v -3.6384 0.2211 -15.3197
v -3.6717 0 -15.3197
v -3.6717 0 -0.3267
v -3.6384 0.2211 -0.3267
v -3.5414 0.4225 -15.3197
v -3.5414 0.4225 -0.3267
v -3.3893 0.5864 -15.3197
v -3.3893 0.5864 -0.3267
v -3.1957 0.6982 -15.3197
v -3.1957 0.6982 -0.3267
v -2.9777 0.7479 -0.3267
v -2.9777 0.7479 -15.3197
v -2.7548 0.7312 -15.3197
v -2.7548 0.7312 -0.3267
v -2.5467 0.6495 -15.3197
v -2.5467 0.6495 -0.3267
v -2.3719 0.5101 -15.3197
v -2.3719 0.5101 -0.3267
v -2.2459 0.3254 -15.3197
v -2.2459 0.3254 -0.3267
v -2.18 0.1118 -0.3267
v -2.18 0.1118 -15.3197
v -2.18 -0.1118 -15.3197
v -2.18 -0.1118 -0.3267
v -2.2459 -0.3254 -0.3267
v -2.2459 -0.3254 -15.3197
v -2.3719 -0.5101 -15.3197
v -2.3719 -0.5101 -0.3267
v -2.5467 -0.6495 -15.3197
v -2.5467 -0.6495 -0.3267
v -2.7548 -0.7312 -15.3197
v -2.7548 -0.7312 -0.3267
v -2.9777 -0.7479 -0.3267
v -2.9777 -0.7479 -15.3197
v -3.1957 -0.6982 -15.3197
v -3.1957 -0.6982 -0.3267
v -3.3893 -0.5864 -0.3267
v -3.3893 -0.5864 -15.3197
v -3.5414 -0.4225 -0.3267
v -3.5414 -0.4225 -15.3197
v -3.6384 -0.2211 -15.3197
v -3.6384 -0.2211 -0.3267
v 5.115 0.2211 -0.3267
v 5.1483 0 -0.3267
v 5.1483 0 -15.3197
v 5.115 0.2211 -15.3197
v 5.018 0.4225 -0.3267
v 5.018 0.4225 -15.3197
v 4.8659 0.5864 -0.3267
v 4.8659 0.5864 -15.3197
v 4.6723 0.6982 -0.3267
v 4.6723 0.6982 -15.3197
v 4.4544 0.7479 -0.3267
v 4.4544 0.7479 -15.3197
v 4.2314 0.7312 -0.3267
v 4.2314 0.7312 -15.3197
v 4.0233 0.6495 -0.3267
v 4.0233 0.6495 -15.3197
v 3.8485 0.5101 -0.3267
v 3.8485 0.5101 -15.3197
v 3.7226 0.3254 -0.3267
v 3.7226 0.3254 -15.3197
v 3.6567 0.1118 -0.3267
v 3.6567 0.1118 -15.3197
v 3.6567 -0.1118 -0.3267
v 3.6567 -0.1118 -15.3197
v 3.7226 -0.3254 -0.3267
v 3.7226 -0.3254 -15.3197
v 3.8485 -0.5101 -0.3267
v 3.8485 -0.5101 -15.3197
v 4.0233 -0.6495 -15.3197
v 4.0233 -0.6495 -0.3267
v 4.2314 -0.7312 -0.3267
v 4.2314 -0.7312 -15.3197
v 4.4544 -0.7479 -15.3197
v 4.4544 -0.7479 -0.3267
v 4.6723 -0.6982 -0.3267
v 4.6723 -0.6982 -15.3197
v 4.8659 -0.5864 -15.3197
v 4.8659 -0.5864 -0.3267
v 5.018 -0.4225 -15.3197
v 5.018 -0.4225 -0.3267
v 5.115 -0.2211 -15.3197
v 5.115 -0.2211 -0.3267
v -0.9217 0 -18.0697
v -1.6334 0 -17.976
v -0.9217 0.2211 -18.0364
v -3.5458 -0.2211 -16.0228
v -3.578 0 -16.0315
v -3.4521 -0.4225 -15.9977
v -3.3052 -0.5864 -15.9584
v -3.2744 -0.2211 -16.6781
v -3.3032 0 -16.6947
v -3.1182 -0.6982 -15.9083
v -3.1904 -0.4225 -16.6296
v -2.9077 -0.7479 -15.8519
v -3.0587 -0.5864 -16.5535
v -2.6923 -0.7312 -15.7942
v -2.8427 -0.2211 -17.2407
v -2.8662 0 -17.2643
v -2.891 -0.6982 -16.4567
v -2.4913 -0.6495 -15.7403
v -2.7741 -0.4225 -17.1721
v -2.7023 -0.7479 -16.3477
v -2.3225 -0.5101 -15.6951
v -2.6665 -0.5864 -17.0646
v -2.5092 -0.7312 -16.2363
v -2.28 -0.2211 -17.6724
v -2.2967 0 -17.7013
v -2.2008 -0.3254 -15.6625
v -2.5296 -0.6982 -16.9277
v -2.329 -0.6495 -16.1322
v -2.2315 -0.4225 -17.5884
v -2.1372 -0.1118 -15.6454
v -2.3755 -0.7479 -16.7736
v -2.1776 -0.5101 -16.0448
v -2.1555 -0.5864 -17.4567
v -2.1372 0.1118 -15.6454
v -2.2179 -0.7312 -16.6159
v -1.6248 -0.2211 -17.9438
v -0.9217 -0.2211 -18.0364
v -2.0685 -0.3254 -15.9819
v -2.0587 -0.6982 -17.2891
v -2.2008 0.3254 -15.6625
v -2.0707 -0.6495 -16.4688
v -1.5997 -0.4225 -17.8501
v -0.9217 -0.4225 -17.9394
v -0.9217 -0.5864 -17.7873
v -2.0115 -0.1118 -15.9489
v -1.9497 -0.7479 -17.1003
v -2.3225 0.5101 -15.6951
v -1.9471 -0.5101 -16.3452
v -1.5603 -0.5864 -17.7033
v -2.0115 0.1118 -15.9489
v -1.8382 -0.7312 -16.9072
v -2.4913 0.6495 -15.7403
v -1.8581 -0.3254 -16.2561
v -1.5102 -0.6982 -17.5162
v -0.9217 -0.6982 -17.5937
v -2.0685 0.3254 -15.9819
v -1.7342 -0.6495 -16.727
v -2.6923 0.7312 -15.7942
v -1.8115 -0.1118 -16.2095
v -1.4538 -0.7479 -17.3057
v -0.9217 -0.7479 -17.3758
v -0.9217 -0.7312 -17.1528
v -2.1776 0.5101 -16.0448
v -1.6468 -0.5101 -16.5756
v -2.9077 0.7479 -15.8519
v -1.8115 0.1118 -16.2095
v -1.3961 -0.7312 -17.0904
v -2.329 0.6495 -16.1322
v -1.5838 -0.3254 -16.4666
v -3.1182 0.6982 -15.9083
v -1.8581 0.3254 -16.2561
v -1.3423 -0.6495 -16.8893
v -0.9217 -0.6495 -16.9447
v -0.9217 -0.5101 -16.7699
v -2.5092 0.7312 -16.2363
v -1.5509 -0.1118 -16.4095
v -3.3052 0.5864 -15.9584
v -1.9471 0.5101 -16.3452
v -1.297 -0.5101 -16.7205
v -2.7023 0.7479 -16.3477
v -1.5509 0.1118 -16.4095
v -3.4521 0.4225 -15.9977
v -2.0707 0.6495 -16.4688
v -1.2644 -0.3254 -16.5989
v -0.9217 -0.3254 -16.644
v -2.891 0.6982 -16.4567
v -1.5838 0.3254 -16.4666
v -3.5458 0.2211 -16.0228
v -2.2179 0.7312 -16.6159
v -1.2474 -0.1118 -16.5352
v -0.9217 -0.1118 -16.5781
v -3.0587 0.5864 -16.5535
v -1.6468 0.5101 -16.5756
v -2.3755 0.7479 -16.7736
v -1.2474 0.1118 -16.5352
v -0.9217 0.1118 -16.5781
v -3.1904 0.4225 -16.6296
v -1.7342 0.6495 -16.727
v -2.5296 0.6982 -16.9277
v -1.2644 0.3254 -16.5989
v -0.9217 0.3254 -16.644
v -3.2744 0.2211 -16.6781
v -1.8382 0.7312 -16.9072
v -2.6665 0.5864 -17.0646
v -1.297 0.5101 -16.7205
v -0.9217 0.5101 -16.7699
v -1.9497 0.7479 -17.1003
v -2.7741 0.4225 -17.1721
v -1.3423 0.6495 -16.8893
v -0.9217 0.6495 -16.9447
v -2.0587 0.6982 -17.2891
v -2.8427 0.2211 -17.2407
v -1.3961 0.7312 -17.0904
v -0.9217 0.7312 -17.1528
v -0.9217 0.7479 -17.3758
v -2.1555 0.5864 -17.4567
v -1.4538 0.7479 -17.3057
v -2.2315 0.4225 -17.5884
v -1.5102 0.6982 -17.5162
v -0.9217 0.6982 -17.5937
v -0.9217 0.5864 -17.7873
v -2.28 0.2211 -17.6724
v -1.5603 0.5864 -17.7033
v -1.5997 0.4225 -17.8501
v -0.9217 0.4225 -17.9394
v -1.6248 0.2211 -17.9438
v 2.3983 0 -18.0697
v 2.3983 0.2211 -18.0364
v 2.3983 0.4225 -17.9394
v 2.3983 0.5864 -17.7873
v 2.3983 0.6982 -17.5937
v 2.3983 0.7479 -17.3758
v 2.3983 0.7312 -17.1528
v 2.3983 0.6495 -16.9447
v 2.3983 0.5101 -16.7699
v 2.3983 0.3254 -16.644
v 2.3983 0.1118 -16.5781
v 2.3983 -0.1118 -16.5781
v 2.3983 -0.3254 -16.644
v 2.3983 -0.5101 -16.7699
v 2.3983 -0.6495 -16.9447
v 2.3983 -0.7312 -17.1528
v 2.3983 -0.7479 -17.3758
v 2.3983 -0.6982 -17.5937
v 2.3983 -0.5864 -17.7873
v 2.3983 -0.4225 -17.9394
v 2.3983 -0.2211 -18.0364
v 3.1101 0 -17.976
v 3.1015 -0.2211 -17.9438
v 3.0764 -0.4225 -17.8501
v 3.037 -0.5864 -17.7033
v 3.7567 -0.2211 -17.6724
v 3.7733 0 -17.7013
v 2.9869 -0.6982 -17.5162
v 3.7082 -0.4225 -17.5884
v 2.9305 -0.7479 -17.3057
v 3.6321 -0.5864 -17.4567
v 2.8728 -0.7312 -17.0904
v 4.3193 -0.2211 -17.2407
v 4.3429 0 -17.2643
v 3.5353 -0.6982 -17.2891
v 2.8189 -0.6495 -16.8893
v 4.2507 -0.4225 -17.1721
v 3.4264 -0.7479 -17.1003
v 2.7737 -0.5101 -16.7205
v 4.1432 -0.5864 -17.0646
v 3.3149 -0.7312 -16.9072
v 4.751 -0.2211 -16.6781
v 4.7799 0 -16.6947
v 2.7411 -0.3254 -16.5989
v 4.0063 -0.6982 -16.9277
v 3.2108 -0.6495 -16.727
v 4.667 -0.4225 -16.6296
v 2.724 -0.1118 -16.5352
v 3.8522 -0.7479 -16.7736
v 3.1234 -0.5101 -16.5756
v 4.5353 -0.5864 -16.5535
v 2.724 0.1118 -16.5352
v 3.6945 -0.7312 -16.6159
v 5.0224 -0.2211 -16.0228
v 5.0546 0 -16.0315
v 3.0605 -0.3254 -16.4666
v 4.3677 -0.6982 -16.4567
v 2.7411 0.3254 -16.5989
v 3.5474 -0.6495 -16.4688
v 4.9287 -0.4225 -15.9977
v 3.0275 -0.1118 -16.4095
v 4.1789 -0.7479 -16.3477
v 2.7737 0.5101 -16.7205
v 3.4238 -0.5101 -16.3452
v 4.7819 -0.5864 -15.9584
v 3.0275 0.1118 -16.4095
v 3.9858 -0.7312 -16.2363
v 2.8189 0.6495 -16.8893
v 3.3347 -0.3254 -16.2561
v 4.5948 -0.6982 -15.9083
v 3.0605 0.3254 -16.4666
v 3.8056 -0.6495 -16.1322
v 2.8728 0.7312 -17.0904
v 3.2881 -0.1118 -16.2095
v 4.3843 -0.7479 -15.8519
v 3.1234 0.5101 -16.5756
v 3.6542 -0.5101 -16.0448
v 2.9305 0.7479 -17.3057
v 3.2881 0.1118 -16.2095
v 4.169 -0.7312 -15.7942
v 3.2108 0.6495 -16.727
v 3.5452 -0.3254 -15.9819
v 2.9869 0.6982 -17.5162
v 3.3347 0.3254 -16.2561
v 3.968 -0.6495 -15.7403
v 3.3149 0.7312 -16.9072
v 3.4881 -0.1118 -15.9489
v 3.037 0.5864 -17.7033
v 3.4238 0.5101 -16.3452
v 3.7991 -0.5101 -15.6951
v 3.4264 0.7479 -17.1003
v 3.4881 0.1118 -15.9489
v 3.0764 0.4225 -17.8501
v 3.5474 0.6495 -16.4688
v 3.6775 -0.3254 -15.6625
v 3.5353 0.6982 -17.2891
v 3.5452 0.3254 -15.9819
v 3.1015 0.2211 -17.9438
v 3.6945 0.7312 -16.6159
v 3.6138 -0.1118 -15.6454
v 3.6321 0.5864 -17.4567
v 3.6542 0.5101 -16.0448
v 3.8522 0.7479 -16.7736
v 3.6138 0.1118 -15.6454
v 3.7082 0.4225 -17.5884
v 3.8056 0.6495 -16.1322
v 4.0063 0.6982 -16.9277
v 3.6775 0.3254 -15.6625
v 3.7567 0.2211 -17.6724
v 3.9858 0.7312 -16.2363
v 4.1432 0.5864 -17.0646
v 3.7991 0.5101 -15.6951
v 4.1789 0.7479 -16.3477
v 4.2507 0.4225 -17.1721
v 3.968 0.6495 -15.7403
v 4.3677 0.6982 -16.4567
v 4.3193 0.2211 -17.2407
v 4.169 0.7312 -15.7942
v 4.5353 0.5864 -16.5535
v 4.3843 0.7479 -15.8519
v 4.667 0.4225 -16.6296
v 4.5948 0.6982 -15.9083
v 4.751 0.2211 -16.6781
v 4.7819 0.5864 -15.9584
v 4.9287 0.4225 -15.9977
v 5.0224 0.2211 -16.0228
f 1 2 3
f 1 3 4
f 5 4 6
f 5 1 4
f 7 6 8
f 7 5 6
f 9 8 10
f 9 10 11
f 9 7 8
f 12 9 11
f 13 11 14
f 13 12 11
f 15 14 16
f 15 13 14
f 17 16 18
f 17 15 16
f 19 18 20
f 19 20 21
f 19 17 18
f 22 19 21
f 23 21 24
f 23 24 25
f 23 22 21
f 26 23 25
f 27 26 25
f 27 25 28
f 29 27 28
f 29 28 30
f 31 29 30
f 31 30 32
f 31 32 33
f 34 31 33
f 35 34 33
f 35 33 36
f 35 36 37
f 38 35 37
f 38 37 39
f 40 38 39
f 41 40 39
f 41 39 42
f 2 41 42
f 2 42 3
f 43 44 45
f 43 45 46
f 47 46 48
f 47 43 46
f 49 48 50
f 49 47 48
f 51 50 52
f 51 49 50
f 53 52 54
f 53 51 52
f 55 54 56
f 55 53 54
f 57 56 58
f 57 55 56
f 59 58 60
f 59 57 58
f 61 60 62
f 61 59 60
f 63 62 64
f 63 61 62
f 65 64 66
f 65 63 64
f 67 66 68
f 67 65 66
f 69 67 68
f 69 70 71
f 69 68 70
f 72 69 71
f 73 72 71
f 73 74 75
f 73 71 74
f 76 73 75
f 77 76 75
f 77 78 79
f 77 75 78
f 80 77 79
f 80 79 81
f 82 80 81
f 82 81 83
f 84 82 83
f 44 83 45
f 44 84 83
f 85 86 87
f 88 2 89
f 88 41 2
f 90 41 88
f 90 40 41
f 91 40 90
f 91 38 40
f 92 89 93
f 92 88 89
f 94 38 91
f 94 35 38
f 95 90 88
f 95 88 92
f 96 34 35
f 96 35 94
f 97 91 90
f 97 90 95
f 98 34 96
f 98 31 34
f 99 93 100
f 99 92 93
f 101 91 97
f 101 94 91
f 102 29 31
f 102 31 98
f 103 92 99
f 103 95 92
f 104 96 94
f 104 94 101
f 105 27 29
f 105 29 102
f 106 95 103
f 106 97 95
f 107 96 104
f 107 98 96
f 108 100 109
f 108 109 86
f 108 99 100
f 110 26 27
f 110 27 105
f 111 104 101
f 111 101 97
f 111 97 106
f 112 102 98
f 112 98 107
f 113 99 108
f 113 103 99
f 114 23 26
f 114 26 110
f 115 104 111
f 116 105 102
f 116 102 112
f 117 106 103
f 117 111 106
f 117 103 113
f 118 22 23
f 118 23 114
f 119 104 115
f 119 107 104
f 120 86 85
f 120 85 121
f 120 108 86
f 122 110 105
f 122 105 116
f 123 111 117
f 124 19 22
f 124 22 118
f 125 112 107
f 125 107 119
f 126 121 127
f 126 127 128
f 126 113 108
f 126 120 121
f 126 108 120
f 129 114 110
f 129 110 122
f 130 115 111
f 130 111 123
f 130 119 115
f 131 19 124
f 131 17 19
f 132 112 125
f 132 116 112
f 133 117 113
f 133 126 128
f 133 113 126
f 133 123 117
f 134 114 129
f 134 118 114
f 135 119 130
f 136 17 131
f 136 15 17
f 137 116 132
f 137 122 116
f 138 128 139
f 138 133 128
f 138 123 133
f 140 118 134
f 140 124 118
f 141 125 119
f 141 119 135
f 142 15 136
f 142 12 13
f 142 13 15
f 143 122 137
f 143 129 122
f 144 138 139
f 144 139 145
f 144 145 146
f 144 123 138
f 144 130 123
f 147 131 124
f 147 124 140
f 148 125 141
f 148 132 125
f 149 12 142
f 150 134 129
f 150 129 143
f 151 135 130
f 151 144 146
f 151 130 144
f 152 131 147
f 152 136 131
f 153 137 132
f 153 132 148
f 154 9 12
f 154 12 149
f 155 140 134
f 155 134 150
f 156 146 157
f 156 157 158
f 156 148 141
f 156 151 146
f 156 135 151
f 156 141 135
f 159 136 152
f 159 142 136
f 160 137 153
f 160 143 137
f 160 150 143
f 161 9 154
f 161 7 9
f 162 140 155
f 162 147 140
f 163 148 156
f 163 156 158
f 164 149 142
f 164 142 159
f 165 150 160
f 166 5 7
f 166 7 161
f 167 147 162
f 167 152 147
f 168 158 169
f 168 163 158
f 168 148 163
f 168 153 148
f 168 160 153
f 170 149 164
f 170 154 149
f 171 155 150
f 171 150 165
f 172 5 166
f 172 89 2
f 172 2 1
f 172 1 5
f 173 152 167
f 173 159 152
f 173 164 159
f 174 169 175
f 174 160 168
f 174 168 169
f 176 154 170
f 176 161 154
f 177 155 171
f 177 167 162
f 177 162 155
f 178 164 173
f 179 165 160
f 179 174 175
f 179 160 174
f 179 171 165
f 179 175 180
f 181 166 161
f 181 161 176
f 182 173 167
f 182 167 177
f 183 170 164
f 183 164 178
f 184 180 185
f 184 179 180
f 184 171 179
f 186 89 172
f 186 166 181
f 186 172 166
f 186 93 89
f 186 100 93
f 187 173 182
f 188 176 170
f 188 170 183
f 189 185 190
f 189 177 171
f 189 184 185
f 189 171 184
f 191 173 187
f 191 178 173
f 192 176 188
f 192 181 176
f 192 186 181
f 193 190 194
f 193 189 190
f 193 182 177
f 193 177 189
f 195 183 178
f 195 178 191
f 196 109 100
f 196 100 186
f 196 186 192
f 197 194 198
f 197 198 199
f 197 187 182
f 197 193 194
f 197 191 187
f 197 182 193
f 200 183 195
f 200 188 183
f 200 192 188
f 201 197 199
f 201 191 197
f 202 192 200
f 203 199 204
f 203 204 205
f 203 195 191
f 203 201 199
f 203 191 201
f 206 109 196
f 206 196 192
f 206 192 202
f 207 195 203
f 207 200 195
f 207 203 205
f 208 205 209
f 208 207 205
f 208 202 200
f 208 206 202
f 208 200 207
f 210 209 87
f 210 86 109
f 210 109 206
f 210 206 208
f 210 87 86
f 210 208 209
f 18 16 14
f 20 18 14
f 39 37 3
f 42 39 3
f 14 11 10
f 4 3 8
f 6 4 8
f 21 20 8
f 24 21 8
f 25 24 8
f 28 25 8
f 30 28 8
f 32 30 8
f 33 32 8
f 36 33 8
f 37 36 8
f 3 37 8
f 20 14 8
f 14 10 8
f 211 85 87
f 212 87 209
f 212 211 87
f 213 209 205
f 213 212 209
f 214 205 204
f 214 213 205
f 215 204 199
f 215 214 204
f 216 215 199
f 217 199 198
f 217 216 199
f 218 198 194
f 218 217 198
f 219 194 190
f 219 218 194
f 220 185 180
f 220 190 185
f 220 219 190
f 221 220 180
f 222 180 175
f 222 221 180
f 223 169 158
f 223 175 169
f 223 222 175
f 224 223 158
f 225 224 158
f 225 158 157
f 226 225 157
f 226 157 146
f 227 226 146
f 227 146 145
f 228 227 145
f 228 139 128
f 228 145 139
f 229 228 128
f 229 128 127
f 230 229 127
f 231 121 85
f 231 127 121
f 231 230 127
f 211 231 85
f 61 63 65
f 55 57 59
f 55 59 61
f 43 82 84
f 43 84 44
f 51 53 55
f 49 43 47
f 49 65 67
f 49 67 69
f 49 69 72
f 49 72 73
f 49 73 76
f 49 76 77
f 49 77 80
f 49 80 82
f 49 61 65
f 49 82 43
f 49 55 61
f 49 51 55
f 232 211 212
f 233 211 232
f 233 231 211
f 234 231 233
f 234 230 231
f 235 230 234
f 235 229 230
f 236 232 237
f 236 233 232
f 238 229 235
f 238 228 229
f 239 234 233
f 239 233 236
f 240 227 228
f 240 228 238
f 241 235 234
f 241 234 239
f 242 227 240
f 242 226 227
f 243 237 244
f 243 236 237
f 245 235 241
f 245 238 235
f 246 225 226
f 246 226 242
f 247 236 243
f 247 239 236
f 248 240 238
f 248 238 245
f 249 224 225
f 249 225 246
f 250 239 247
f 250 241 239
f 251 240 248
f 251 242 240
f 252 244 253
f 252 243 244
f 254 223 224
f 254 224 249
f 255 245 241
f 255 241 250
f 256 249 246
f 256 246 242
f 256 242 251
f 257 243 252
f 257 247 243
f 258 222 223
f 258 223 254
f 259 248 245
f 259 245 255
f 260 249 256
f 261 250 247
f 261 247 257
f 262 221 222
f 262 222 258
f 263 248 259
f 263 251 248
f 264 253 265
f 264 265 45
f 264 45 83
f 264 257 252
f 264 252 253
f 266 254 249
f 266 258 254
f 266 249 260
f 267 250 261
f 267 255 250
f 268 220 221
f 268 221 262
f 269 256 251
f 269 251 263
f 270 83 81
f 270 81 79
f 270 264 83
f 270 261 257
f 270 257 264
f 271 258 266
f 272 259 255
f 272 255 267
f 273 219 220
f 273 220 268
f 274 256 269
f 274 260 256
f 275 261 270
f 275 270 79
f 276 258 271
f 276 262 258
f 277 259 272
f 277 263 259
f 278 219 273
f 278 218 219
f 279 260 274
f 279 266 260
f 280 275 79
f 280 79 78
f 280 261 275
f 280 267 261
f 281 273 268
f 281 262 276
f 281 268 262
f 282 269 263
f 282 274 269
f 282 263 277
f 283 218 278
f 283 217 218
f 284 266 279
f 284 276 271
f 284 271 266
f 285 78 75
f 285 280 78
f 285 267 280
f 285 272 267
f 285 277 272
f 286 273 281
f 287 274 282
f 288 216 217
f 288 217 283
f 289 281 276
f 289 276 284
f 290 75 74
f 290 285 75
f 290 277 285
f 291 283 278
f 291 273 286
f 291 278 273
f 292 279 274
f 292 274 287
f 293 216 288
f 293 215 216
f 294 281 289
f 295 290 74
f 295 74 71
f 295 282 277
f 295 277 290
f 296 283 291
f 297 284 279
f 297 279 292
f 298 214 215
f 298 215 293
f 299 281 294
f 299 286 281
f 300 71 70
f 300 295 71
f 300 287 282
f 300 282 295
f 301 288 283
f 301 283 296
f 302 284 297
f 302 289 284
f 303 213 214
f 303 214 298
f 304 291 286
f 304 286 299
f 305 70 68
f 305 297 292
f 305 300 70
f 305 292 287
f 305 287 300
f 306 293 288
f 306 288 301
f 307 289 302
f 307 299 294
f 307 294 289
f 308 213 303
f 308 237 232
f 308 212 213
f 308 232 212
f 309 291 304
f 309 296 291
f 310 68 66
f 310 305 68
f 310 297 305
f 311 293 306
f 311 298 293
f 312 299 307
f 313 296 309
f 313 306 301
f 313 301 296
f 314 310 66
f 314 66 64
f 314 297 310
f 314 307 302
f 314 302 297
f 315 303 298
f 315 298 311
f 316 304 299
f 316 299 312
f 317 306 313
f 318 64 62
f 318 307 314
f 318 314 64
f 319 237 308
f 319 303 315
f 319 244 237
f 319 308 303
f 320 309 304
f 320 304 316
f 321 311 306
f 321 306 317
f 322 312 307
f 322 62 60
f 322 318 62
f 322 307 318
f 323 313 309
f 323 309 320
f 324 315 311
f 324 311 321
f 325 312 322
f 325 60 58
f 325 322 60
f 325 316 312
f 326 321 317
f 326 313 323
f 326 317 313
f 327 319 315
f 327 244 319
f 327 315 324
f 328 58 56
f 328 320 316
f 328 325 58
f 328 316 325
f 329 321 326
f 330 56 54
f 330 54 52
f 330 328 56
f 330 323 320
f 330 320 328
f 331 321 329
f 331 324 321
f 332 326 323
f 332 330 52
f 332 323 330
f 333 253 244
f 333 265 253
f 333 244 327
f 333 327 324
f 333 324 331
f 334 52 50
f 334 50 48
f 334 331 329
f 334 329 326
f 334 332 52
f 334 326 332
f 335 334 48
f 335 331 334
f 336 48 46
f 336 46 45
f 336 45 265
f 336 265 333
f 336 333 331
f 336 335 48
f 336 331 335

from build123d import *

# Parameters (mm, degrees)
SKETCH_7_R = 0.75


with BuildPart() as part:
    # По траектории9: sweep along a path in Эскиз1
    with BuildLine(Plane(origin=(0, 0, 0), x_dir=(1, 0, 0), z_dir=(0, 1, 0))) as sweep_9_path:
        Line((-2.921672053, 0.326690485), (-2.921672053, 15.31971545))
        ThreePointArc((-2.921672053, 15.31971545), (-2.335885615, 16.733929012), (-0.921672053, 17.31971545))
        Line((-0.921672053, 17.31971545), (2.398327947, 17.31971545))
        ThreePointArc((2.398327947, 17.31971545), (3.812541509, 16.733929012), (4.398327947, 15.31971545))
        Line((4.398327947, 15.31971545), (4.398327947, 0.326690485))
    # Эскиз7 → По траектории9 (sweep)
    with BuildSketch(Plane(origin=(-2.921672053, 0, -0.326690485), x_dir=(-1, 0, 0), z_dir=(0, 0, -1))):
        Circle(SKETCH_7_R)
    sweep(path=sweep_9_path.line)


solid = part.part
